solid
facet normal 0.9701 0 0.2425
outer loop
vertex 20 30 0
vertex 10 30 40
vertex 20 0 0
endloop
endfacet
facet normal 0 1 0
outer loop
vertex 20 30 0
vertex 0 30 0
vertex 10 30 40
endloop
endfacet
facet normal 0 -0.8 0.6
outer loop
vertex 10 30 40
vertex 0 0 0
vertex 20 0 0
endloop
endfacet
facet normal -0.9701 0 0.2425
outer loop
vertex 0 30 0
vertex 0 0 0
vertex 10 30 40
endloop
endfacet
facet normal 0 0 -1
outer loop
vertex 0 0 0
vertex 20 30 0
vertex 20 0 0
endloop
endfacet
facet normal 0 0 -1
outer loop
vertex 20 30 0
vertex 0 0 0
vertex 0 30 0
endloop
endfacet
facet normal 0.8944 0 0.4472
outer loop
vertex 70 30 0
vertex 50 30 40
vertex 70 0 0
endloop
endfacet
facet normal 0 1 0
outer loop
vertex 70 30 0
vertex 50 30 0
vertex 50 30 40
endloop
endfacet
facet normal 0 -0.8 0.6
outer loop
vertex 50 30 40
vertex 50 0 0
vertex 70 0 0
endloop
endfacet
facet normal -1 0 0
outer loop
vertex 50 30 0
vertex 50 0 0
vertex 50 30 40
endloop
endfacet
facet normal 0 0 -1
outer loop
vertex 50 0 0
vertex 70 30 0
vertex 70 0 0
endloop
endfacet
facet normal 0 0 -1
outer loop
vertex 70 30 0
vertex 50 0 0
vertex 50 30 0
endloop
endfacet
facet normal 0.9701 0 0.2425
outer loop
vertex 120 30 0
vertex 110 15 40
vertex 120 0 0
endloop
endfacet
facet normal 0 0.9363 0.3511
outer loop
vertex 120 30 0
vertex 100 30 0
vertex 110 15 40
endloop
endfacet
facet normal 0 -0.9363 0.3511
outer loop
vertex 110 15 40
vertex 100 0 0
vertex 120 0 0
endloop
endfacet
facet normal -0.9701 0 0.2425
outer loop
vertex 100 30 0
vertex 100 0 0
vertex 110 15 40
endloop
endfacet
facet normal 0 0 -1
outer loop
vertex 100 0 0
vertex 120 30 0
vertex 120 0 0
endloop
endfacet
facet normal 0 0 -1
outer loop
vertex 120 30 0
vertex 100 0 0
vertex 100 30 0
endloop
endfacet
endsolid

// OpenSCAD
use <MCAD/libtriangles.scad>

rightpyramid (20, 30, 40);

translate([50, 0, 0]) cornerpyramid (20, 30, 40);

translate([100, 0, 0])  eqlpyramid (20, 30, 40);
